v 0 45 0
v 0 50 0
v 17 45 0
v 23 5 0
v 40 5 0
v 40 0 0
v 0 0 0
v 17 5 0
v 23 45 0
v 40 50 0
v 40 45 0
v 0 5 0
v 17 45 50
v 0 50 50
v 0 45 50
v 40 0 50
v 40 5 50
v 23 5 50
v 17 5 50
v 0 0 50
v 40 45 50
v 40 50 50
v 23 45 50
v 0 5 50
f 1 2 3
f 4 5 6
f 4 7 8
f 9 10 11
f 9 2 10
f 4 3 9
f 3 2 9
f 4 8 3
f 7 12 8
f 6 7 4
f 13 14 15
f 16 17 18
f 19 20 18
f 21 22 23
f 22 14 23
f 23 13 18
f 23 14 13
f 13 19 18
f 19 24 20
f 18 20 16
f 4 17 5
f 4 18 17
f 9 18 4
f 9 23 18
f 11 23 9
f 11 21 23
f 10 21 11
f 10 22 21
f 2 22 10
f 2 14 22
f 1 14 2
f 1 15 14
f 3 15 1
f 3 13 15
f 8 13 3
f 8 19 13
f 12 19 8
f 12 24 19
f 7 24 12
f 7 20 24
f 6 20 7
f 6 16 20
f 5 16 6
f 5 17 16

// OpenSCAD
$fn = 32;

// ----------------------------------------------------------------------
// Structural section: ibeam 40 x 50 mm
// ----------------------------------------------------------------------

// --- parameters (mm) ---
sec_w = 40;               // section width, X
sec_h = 50;               // section height, Y
flange_t = 5;             // flange thickness
web_t = 6;                // web thickness
plate_t = 50;             // cut length, Z (extrusion height)

profile = [[0, 0], [40, 0], [40, 5], [23, 5], [23, 45], [40, 45], [40, 50], [0, 50], [0, 45], [17, 45], [17, 5], [0, 5]];  // primary outline, 12 points, counter clockwise

// --- the one profile operation ---
linear_extrude(height = plate_t) polygon(points = profile);
